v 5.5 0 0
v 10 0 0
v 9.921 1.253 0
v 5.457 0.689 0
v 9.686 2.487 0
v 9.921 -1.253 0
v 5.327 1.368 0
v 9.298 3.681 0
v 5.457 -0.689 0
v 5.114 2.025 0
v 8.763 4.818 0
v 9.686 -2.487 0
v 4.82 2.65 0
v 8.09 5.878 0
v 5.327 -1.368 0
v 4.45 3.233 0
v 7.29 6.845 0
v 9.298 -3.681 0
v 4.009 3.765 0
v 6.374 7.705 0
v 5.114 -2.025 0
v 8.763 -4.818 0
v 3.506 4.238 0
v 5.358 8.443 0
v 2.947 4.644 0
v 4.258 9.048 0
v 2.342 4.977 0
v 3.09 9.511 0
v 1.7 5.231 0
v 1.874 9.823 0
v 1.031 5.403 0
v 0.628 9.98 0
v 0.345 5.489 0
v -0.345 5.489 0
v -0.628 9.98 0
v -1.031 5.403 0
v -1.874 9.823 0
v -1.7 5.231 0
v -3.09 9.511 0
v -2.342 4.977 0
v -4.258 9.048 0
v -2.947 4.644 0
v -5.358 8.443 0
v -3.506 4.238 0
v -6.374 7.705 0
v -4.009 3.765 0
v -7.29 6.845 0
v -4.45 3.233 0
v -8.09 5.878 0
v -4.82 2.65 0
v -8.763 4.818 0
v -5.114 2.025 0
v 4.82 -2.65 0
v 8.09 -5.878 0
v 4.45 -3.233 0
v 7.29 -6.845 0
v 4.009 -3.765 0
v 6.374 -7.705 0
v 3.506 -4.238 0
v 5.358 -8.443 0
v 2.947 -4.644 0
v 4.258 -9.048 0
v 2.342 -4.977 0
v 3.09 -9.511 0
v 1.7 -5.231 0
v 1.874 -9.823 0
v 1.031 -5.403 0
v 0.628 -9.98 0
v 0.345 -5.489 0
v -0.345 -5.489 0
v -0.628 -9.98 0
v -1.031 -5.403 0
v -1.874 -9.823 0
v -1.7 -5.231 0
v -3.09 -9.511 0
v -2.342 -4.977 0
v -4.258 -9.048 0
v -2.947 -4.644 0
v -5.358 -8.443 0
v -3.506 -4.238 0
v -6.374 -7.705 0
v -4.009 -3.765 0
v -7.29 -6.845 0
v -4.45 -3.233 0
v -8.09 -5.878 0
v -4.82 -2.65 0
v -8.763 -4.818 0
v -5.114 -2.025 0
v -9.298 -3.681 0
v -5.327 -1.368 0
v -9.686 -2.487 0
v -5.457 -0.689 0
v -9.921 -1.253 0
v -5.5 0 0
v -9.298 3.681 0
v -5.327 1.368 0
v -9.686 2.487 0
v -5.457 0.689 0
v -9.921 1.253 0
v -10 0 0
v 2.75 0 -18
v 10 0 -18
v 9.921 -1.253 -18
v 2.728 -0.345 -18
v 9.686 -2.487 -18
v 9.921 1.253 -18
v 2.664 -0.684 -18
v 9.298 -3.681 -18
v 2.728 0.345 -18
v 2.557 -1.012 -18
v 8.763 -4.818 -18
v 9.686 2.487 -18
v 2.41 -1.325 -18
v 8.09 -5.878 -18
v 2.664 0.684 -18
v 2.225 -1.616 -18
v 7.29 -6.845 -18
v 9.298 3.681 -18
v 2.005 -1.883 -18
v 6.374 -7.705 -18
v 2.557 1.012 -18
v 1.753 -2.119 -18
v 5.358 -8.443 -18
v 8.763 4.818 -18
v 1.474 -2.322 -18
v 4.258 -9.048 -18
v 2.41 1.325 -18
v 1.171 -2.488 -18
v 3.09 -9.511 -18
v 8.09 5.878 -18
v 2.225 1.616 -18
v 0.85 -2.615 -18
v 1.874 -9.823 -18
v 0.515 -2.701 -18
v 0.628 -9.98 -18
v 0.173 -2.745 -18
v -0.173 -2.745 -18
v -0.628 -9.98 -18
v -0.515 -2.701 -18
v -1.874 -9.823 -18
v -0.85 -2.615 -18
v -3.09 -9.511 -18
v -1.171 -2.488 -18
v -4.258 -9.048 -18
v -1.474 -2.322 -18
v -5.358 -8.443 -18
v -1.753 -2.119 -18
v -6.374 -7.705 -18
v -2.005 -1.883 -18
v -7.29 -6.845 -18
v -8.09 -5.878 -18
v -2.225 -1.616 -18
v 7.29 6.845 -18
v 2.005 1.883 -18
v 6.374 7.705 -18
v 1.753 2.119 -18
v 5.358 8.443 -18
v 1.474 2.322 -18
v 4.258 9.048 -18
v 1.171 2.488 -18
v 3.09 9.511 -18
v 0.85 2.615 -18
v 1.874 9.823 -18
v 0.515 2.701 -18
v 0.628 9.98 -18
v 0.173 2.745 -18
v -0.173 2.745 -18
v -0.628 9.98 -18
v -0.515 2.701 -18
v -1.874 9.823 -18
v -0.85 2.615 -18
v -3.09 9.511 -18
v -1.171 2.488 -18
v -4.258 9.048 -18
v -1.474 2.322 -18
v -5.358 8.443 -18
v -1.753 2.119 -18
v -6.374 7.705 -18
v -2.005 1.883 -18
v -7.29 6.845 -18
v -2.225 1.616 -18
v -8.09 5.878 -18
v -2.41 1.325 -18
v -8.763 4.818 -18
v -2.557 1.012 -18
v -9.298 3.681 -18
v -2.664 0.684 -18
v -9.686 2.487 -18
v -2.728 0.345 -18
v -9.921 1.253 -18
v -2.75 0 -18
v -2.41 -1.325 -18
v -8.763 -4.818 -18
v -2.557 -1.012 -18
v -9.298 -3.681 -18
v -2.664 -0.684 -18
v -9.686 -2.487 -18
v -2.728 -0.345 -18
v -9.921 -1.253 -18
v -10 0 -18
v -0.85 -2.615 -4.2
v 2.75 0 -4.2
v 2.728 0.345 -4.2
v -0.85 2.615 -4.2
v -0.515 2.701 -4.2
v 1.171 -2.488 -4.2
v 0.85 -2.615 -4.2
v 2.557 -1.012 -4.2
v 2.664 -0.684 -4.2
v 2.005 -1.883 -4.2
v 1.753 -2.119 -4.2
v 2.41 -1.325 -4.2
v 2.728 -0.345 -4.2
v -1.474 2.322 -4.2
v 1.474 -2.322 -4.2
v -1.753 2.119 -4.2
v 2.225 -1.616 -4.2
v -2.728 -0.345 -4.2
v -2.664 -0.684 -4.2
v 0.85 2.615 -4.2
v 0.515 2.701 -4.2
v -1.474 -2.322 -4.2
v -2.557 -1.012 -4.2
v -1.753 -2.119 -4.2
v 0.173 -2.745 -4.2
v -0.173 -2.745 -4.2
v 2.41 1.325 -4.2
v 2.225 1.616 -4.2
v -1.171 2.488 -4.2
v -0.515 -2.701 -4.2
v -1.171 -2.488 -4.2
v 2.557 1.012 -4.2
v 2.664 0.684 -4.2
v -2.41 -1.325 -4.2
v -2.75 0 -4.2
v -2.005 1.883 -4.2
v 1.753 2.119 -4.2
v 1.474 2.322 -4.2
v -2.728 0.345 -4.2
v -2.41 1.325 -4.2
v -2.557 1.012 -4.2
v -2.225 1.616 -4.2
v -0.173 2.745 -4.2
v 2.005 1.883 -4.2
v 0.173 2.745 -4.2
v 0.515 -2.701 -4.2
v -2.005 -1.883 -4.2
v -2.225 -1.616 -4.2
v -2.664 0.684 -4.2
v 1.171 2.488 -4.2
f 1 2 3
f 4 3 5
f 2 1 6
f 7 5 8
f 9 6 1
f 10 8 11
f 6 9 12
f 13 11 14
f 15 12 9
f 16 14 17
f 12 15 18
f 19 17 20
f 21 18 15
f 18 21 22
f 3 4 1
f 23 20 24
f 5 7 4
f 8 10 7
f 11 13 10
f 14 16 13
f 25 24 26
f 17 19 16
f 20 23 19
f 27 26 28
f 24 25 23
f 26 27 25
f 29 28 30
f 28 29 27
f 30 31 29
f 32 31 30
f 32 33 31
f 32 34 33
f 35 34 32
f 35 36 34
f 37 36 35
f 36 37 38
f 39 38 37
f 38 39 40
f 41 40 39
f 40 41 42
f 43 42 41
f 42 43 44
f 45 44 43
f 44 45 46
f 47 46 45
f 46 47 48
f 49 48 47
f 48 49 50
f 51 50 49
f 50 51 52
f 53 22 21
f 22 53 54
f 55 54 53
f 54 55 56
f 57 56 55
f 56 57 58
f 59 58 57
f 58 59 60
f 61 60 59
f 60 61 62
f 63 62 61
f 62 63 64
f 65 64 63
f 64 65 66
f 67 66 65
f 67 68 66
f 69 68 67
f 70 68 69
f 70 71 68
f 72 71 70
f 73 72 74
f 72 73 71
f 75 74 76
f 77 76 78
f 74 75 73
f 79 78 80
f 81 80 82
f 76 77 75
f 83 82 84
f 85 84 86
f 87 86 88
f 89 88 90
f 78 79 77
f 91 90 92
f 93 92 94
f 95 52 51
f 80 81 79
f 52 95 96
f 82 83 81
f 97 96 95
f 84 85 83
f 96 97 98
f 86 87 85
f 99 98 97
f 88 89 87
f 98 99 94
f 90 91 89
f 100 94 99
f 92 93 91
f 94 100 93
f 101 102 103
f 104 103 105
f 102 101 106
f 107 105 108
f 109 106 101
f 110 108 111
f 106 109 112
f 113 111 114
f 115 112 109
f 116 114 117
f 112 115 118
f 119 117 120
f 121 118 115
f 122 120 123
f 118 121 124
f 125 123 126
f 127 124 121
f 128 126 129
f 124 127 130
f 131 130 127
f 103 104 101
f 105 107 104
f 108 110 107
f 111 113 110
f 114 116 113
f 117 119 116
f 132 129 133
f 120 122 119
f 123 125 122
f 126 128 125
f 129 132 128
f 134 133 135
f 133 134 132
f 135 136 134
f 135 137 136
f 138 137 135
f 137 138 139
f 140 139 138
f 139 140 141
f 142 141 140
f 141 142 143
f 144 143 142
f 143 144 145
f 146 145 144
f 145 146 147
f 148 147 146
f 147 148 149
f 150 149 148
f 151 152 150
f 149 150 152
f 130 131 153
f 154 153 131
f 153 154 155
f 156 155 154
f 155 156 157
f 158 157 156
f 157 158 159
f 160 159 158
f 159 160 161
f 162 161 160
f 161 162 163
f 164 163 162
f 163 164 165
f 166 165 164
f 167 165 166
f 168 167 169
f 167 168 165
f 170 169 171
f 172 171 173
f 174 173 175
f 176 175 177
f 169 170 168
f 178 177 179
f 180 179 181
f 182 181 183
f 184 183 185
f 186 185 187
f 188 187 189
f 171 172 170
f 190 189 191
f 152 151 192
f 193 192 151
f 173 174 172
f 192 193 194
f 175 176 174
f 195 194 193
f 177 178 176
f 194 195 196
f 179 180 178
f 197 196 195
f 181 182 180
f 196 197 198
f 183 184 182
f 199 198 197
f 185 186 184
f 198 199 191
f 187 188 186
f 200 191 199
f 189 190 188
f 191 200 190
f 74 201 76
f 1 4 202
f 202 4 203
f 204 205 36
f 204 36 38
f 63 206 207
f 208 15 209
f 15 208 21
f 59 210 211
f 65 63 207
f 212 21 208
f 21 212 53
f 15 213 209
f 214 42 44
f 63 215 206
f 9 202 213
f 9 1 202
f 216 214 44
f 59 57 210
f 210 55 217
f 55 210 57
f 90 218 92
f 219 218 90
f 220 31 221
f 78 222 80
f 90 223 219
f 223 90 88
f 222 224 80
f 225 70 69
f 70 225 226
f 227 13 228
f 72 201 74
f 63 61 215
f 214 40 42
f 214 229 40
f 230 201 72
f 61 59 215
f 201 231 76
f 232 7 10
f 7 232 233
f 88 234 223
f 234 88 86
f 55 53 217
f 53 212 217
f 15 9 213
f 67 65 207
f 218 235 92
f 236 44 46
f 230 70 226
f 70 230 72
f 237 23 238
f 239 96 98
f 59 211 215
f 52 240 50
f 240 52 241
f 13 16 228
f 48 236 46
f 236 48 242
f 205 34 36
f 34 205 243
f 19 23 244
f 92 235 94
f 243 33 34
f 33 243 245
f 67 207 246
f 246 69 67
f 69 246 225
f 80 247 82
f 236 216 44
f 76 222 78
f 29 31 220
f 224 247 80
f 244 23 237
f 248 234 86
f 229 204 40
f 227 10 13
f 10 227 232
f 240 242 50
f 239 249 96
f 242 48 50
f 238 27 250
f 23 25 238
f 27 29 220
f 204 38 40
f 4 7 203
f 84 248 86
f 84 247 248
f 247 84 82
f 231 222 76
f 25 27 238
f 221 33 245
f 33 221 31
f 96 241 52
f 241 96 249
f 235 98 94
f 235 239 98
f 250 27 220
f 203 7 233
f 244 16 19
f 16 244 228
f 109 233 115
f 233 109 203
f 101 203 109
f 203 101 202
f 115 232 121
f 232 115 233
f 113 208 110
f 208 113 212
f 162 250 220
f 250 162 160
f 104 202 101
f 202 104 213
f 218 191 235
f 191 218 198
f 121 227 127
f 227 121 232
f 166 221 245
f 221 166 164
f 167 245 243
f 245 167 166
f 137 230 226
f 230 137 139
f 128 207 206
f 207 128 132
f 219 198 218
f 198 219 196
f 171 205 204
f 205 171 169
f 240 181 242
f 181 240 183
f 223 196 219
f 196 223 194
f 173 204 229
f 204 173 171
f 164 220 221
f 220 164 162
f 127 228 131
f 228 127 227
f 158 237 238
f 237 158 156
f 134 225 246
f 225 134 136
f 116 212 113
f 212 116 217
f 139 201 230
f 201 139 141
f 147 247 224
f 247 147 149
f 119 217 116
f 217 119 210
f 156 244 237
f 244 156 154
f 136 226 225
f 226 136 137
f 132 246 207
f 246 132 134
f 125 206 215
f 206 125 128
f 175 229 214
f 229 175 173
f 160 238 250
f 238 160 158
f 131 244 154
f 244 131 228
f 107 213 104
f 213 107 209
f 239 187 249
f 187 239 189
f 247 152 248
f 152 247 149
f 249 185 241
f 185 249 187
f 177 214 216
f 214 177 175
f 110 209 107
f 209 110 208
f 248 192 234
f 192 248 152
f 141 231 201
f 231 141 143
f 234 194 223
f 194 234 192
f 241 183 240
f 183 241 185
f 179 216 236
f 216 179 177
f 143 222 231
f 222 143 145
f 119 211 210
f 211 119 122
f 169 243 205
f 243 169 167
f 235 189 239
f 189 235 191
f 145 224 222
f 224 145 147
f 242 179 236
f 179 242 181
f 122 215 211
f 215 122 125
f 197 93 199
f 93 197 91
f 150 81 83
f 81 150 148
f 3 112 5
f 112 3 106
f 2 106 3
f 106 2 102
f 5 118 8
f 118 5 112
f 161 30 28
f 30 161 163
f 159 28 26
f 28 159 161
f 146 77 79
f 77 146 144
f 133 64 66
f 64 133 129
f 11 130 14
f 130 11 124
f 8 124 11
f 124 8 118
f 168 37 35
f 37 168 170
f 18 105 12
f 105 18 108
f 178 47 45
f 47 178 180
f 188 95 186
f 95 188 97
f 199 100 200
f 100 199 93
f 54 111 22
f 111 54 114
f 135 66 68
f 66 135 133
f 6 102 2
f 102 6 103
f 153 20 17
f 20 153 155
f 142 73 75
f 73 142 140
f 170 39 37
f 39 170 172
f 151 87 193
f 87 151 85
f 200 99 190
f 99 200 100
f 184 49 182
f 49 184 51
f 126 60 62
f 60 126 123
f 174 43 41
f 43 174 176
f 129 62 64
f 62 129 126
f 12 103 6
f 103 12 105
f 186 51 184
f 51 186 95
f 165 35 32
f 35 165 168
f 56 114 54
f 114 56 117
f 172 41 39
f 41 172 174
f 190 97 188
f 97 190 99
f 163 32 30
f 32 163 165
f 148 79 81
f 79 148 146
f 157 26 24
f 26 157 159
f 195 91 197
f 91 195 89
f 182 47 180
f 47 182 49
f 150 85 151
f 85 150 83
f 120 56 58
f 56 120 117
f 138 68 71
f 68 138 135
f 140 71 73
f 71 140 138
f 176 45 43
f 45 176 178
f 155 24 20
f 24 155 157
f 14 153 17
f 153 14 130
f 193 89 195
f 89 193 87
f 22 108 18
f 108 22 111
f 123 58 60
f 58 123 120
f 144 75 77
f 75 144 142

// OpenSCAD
$fn = 50;


difference() {
	union() {
		translate(v = [0, 0, -18.0000000000]) {
			cylinder(h = 18, r = 10.0000000000);
		}
		cylinder(h = 0, r = 13.0000000000);
	}
	union() {
		translate(v = [0, 0, 0]) {
			rotate(a = [0, 0, 0]) {
				difference() {
					union() {
						#translate(v = [0, 0, -18.0000000000]) {
							cylinder(h = 18, r = 2.2500000000);
						}
						#translate(v = [0, 0, -4.2000000000]) {
							cylinder(h = 4.2000000000, r1 = 2.7500000000, r2 = 5.5000000000);
						}
						#translate(v = [0, 0, -18.0000000000]) {
							cylinder(h = 18, r = 2.7500000000);
						}
						#translate(v = [0, 0, -18.0000000000]) {
							cylinder(h = 18, r = 2.2500000000);
						}
					}
					union();
				}
			}
		}
	}
}
